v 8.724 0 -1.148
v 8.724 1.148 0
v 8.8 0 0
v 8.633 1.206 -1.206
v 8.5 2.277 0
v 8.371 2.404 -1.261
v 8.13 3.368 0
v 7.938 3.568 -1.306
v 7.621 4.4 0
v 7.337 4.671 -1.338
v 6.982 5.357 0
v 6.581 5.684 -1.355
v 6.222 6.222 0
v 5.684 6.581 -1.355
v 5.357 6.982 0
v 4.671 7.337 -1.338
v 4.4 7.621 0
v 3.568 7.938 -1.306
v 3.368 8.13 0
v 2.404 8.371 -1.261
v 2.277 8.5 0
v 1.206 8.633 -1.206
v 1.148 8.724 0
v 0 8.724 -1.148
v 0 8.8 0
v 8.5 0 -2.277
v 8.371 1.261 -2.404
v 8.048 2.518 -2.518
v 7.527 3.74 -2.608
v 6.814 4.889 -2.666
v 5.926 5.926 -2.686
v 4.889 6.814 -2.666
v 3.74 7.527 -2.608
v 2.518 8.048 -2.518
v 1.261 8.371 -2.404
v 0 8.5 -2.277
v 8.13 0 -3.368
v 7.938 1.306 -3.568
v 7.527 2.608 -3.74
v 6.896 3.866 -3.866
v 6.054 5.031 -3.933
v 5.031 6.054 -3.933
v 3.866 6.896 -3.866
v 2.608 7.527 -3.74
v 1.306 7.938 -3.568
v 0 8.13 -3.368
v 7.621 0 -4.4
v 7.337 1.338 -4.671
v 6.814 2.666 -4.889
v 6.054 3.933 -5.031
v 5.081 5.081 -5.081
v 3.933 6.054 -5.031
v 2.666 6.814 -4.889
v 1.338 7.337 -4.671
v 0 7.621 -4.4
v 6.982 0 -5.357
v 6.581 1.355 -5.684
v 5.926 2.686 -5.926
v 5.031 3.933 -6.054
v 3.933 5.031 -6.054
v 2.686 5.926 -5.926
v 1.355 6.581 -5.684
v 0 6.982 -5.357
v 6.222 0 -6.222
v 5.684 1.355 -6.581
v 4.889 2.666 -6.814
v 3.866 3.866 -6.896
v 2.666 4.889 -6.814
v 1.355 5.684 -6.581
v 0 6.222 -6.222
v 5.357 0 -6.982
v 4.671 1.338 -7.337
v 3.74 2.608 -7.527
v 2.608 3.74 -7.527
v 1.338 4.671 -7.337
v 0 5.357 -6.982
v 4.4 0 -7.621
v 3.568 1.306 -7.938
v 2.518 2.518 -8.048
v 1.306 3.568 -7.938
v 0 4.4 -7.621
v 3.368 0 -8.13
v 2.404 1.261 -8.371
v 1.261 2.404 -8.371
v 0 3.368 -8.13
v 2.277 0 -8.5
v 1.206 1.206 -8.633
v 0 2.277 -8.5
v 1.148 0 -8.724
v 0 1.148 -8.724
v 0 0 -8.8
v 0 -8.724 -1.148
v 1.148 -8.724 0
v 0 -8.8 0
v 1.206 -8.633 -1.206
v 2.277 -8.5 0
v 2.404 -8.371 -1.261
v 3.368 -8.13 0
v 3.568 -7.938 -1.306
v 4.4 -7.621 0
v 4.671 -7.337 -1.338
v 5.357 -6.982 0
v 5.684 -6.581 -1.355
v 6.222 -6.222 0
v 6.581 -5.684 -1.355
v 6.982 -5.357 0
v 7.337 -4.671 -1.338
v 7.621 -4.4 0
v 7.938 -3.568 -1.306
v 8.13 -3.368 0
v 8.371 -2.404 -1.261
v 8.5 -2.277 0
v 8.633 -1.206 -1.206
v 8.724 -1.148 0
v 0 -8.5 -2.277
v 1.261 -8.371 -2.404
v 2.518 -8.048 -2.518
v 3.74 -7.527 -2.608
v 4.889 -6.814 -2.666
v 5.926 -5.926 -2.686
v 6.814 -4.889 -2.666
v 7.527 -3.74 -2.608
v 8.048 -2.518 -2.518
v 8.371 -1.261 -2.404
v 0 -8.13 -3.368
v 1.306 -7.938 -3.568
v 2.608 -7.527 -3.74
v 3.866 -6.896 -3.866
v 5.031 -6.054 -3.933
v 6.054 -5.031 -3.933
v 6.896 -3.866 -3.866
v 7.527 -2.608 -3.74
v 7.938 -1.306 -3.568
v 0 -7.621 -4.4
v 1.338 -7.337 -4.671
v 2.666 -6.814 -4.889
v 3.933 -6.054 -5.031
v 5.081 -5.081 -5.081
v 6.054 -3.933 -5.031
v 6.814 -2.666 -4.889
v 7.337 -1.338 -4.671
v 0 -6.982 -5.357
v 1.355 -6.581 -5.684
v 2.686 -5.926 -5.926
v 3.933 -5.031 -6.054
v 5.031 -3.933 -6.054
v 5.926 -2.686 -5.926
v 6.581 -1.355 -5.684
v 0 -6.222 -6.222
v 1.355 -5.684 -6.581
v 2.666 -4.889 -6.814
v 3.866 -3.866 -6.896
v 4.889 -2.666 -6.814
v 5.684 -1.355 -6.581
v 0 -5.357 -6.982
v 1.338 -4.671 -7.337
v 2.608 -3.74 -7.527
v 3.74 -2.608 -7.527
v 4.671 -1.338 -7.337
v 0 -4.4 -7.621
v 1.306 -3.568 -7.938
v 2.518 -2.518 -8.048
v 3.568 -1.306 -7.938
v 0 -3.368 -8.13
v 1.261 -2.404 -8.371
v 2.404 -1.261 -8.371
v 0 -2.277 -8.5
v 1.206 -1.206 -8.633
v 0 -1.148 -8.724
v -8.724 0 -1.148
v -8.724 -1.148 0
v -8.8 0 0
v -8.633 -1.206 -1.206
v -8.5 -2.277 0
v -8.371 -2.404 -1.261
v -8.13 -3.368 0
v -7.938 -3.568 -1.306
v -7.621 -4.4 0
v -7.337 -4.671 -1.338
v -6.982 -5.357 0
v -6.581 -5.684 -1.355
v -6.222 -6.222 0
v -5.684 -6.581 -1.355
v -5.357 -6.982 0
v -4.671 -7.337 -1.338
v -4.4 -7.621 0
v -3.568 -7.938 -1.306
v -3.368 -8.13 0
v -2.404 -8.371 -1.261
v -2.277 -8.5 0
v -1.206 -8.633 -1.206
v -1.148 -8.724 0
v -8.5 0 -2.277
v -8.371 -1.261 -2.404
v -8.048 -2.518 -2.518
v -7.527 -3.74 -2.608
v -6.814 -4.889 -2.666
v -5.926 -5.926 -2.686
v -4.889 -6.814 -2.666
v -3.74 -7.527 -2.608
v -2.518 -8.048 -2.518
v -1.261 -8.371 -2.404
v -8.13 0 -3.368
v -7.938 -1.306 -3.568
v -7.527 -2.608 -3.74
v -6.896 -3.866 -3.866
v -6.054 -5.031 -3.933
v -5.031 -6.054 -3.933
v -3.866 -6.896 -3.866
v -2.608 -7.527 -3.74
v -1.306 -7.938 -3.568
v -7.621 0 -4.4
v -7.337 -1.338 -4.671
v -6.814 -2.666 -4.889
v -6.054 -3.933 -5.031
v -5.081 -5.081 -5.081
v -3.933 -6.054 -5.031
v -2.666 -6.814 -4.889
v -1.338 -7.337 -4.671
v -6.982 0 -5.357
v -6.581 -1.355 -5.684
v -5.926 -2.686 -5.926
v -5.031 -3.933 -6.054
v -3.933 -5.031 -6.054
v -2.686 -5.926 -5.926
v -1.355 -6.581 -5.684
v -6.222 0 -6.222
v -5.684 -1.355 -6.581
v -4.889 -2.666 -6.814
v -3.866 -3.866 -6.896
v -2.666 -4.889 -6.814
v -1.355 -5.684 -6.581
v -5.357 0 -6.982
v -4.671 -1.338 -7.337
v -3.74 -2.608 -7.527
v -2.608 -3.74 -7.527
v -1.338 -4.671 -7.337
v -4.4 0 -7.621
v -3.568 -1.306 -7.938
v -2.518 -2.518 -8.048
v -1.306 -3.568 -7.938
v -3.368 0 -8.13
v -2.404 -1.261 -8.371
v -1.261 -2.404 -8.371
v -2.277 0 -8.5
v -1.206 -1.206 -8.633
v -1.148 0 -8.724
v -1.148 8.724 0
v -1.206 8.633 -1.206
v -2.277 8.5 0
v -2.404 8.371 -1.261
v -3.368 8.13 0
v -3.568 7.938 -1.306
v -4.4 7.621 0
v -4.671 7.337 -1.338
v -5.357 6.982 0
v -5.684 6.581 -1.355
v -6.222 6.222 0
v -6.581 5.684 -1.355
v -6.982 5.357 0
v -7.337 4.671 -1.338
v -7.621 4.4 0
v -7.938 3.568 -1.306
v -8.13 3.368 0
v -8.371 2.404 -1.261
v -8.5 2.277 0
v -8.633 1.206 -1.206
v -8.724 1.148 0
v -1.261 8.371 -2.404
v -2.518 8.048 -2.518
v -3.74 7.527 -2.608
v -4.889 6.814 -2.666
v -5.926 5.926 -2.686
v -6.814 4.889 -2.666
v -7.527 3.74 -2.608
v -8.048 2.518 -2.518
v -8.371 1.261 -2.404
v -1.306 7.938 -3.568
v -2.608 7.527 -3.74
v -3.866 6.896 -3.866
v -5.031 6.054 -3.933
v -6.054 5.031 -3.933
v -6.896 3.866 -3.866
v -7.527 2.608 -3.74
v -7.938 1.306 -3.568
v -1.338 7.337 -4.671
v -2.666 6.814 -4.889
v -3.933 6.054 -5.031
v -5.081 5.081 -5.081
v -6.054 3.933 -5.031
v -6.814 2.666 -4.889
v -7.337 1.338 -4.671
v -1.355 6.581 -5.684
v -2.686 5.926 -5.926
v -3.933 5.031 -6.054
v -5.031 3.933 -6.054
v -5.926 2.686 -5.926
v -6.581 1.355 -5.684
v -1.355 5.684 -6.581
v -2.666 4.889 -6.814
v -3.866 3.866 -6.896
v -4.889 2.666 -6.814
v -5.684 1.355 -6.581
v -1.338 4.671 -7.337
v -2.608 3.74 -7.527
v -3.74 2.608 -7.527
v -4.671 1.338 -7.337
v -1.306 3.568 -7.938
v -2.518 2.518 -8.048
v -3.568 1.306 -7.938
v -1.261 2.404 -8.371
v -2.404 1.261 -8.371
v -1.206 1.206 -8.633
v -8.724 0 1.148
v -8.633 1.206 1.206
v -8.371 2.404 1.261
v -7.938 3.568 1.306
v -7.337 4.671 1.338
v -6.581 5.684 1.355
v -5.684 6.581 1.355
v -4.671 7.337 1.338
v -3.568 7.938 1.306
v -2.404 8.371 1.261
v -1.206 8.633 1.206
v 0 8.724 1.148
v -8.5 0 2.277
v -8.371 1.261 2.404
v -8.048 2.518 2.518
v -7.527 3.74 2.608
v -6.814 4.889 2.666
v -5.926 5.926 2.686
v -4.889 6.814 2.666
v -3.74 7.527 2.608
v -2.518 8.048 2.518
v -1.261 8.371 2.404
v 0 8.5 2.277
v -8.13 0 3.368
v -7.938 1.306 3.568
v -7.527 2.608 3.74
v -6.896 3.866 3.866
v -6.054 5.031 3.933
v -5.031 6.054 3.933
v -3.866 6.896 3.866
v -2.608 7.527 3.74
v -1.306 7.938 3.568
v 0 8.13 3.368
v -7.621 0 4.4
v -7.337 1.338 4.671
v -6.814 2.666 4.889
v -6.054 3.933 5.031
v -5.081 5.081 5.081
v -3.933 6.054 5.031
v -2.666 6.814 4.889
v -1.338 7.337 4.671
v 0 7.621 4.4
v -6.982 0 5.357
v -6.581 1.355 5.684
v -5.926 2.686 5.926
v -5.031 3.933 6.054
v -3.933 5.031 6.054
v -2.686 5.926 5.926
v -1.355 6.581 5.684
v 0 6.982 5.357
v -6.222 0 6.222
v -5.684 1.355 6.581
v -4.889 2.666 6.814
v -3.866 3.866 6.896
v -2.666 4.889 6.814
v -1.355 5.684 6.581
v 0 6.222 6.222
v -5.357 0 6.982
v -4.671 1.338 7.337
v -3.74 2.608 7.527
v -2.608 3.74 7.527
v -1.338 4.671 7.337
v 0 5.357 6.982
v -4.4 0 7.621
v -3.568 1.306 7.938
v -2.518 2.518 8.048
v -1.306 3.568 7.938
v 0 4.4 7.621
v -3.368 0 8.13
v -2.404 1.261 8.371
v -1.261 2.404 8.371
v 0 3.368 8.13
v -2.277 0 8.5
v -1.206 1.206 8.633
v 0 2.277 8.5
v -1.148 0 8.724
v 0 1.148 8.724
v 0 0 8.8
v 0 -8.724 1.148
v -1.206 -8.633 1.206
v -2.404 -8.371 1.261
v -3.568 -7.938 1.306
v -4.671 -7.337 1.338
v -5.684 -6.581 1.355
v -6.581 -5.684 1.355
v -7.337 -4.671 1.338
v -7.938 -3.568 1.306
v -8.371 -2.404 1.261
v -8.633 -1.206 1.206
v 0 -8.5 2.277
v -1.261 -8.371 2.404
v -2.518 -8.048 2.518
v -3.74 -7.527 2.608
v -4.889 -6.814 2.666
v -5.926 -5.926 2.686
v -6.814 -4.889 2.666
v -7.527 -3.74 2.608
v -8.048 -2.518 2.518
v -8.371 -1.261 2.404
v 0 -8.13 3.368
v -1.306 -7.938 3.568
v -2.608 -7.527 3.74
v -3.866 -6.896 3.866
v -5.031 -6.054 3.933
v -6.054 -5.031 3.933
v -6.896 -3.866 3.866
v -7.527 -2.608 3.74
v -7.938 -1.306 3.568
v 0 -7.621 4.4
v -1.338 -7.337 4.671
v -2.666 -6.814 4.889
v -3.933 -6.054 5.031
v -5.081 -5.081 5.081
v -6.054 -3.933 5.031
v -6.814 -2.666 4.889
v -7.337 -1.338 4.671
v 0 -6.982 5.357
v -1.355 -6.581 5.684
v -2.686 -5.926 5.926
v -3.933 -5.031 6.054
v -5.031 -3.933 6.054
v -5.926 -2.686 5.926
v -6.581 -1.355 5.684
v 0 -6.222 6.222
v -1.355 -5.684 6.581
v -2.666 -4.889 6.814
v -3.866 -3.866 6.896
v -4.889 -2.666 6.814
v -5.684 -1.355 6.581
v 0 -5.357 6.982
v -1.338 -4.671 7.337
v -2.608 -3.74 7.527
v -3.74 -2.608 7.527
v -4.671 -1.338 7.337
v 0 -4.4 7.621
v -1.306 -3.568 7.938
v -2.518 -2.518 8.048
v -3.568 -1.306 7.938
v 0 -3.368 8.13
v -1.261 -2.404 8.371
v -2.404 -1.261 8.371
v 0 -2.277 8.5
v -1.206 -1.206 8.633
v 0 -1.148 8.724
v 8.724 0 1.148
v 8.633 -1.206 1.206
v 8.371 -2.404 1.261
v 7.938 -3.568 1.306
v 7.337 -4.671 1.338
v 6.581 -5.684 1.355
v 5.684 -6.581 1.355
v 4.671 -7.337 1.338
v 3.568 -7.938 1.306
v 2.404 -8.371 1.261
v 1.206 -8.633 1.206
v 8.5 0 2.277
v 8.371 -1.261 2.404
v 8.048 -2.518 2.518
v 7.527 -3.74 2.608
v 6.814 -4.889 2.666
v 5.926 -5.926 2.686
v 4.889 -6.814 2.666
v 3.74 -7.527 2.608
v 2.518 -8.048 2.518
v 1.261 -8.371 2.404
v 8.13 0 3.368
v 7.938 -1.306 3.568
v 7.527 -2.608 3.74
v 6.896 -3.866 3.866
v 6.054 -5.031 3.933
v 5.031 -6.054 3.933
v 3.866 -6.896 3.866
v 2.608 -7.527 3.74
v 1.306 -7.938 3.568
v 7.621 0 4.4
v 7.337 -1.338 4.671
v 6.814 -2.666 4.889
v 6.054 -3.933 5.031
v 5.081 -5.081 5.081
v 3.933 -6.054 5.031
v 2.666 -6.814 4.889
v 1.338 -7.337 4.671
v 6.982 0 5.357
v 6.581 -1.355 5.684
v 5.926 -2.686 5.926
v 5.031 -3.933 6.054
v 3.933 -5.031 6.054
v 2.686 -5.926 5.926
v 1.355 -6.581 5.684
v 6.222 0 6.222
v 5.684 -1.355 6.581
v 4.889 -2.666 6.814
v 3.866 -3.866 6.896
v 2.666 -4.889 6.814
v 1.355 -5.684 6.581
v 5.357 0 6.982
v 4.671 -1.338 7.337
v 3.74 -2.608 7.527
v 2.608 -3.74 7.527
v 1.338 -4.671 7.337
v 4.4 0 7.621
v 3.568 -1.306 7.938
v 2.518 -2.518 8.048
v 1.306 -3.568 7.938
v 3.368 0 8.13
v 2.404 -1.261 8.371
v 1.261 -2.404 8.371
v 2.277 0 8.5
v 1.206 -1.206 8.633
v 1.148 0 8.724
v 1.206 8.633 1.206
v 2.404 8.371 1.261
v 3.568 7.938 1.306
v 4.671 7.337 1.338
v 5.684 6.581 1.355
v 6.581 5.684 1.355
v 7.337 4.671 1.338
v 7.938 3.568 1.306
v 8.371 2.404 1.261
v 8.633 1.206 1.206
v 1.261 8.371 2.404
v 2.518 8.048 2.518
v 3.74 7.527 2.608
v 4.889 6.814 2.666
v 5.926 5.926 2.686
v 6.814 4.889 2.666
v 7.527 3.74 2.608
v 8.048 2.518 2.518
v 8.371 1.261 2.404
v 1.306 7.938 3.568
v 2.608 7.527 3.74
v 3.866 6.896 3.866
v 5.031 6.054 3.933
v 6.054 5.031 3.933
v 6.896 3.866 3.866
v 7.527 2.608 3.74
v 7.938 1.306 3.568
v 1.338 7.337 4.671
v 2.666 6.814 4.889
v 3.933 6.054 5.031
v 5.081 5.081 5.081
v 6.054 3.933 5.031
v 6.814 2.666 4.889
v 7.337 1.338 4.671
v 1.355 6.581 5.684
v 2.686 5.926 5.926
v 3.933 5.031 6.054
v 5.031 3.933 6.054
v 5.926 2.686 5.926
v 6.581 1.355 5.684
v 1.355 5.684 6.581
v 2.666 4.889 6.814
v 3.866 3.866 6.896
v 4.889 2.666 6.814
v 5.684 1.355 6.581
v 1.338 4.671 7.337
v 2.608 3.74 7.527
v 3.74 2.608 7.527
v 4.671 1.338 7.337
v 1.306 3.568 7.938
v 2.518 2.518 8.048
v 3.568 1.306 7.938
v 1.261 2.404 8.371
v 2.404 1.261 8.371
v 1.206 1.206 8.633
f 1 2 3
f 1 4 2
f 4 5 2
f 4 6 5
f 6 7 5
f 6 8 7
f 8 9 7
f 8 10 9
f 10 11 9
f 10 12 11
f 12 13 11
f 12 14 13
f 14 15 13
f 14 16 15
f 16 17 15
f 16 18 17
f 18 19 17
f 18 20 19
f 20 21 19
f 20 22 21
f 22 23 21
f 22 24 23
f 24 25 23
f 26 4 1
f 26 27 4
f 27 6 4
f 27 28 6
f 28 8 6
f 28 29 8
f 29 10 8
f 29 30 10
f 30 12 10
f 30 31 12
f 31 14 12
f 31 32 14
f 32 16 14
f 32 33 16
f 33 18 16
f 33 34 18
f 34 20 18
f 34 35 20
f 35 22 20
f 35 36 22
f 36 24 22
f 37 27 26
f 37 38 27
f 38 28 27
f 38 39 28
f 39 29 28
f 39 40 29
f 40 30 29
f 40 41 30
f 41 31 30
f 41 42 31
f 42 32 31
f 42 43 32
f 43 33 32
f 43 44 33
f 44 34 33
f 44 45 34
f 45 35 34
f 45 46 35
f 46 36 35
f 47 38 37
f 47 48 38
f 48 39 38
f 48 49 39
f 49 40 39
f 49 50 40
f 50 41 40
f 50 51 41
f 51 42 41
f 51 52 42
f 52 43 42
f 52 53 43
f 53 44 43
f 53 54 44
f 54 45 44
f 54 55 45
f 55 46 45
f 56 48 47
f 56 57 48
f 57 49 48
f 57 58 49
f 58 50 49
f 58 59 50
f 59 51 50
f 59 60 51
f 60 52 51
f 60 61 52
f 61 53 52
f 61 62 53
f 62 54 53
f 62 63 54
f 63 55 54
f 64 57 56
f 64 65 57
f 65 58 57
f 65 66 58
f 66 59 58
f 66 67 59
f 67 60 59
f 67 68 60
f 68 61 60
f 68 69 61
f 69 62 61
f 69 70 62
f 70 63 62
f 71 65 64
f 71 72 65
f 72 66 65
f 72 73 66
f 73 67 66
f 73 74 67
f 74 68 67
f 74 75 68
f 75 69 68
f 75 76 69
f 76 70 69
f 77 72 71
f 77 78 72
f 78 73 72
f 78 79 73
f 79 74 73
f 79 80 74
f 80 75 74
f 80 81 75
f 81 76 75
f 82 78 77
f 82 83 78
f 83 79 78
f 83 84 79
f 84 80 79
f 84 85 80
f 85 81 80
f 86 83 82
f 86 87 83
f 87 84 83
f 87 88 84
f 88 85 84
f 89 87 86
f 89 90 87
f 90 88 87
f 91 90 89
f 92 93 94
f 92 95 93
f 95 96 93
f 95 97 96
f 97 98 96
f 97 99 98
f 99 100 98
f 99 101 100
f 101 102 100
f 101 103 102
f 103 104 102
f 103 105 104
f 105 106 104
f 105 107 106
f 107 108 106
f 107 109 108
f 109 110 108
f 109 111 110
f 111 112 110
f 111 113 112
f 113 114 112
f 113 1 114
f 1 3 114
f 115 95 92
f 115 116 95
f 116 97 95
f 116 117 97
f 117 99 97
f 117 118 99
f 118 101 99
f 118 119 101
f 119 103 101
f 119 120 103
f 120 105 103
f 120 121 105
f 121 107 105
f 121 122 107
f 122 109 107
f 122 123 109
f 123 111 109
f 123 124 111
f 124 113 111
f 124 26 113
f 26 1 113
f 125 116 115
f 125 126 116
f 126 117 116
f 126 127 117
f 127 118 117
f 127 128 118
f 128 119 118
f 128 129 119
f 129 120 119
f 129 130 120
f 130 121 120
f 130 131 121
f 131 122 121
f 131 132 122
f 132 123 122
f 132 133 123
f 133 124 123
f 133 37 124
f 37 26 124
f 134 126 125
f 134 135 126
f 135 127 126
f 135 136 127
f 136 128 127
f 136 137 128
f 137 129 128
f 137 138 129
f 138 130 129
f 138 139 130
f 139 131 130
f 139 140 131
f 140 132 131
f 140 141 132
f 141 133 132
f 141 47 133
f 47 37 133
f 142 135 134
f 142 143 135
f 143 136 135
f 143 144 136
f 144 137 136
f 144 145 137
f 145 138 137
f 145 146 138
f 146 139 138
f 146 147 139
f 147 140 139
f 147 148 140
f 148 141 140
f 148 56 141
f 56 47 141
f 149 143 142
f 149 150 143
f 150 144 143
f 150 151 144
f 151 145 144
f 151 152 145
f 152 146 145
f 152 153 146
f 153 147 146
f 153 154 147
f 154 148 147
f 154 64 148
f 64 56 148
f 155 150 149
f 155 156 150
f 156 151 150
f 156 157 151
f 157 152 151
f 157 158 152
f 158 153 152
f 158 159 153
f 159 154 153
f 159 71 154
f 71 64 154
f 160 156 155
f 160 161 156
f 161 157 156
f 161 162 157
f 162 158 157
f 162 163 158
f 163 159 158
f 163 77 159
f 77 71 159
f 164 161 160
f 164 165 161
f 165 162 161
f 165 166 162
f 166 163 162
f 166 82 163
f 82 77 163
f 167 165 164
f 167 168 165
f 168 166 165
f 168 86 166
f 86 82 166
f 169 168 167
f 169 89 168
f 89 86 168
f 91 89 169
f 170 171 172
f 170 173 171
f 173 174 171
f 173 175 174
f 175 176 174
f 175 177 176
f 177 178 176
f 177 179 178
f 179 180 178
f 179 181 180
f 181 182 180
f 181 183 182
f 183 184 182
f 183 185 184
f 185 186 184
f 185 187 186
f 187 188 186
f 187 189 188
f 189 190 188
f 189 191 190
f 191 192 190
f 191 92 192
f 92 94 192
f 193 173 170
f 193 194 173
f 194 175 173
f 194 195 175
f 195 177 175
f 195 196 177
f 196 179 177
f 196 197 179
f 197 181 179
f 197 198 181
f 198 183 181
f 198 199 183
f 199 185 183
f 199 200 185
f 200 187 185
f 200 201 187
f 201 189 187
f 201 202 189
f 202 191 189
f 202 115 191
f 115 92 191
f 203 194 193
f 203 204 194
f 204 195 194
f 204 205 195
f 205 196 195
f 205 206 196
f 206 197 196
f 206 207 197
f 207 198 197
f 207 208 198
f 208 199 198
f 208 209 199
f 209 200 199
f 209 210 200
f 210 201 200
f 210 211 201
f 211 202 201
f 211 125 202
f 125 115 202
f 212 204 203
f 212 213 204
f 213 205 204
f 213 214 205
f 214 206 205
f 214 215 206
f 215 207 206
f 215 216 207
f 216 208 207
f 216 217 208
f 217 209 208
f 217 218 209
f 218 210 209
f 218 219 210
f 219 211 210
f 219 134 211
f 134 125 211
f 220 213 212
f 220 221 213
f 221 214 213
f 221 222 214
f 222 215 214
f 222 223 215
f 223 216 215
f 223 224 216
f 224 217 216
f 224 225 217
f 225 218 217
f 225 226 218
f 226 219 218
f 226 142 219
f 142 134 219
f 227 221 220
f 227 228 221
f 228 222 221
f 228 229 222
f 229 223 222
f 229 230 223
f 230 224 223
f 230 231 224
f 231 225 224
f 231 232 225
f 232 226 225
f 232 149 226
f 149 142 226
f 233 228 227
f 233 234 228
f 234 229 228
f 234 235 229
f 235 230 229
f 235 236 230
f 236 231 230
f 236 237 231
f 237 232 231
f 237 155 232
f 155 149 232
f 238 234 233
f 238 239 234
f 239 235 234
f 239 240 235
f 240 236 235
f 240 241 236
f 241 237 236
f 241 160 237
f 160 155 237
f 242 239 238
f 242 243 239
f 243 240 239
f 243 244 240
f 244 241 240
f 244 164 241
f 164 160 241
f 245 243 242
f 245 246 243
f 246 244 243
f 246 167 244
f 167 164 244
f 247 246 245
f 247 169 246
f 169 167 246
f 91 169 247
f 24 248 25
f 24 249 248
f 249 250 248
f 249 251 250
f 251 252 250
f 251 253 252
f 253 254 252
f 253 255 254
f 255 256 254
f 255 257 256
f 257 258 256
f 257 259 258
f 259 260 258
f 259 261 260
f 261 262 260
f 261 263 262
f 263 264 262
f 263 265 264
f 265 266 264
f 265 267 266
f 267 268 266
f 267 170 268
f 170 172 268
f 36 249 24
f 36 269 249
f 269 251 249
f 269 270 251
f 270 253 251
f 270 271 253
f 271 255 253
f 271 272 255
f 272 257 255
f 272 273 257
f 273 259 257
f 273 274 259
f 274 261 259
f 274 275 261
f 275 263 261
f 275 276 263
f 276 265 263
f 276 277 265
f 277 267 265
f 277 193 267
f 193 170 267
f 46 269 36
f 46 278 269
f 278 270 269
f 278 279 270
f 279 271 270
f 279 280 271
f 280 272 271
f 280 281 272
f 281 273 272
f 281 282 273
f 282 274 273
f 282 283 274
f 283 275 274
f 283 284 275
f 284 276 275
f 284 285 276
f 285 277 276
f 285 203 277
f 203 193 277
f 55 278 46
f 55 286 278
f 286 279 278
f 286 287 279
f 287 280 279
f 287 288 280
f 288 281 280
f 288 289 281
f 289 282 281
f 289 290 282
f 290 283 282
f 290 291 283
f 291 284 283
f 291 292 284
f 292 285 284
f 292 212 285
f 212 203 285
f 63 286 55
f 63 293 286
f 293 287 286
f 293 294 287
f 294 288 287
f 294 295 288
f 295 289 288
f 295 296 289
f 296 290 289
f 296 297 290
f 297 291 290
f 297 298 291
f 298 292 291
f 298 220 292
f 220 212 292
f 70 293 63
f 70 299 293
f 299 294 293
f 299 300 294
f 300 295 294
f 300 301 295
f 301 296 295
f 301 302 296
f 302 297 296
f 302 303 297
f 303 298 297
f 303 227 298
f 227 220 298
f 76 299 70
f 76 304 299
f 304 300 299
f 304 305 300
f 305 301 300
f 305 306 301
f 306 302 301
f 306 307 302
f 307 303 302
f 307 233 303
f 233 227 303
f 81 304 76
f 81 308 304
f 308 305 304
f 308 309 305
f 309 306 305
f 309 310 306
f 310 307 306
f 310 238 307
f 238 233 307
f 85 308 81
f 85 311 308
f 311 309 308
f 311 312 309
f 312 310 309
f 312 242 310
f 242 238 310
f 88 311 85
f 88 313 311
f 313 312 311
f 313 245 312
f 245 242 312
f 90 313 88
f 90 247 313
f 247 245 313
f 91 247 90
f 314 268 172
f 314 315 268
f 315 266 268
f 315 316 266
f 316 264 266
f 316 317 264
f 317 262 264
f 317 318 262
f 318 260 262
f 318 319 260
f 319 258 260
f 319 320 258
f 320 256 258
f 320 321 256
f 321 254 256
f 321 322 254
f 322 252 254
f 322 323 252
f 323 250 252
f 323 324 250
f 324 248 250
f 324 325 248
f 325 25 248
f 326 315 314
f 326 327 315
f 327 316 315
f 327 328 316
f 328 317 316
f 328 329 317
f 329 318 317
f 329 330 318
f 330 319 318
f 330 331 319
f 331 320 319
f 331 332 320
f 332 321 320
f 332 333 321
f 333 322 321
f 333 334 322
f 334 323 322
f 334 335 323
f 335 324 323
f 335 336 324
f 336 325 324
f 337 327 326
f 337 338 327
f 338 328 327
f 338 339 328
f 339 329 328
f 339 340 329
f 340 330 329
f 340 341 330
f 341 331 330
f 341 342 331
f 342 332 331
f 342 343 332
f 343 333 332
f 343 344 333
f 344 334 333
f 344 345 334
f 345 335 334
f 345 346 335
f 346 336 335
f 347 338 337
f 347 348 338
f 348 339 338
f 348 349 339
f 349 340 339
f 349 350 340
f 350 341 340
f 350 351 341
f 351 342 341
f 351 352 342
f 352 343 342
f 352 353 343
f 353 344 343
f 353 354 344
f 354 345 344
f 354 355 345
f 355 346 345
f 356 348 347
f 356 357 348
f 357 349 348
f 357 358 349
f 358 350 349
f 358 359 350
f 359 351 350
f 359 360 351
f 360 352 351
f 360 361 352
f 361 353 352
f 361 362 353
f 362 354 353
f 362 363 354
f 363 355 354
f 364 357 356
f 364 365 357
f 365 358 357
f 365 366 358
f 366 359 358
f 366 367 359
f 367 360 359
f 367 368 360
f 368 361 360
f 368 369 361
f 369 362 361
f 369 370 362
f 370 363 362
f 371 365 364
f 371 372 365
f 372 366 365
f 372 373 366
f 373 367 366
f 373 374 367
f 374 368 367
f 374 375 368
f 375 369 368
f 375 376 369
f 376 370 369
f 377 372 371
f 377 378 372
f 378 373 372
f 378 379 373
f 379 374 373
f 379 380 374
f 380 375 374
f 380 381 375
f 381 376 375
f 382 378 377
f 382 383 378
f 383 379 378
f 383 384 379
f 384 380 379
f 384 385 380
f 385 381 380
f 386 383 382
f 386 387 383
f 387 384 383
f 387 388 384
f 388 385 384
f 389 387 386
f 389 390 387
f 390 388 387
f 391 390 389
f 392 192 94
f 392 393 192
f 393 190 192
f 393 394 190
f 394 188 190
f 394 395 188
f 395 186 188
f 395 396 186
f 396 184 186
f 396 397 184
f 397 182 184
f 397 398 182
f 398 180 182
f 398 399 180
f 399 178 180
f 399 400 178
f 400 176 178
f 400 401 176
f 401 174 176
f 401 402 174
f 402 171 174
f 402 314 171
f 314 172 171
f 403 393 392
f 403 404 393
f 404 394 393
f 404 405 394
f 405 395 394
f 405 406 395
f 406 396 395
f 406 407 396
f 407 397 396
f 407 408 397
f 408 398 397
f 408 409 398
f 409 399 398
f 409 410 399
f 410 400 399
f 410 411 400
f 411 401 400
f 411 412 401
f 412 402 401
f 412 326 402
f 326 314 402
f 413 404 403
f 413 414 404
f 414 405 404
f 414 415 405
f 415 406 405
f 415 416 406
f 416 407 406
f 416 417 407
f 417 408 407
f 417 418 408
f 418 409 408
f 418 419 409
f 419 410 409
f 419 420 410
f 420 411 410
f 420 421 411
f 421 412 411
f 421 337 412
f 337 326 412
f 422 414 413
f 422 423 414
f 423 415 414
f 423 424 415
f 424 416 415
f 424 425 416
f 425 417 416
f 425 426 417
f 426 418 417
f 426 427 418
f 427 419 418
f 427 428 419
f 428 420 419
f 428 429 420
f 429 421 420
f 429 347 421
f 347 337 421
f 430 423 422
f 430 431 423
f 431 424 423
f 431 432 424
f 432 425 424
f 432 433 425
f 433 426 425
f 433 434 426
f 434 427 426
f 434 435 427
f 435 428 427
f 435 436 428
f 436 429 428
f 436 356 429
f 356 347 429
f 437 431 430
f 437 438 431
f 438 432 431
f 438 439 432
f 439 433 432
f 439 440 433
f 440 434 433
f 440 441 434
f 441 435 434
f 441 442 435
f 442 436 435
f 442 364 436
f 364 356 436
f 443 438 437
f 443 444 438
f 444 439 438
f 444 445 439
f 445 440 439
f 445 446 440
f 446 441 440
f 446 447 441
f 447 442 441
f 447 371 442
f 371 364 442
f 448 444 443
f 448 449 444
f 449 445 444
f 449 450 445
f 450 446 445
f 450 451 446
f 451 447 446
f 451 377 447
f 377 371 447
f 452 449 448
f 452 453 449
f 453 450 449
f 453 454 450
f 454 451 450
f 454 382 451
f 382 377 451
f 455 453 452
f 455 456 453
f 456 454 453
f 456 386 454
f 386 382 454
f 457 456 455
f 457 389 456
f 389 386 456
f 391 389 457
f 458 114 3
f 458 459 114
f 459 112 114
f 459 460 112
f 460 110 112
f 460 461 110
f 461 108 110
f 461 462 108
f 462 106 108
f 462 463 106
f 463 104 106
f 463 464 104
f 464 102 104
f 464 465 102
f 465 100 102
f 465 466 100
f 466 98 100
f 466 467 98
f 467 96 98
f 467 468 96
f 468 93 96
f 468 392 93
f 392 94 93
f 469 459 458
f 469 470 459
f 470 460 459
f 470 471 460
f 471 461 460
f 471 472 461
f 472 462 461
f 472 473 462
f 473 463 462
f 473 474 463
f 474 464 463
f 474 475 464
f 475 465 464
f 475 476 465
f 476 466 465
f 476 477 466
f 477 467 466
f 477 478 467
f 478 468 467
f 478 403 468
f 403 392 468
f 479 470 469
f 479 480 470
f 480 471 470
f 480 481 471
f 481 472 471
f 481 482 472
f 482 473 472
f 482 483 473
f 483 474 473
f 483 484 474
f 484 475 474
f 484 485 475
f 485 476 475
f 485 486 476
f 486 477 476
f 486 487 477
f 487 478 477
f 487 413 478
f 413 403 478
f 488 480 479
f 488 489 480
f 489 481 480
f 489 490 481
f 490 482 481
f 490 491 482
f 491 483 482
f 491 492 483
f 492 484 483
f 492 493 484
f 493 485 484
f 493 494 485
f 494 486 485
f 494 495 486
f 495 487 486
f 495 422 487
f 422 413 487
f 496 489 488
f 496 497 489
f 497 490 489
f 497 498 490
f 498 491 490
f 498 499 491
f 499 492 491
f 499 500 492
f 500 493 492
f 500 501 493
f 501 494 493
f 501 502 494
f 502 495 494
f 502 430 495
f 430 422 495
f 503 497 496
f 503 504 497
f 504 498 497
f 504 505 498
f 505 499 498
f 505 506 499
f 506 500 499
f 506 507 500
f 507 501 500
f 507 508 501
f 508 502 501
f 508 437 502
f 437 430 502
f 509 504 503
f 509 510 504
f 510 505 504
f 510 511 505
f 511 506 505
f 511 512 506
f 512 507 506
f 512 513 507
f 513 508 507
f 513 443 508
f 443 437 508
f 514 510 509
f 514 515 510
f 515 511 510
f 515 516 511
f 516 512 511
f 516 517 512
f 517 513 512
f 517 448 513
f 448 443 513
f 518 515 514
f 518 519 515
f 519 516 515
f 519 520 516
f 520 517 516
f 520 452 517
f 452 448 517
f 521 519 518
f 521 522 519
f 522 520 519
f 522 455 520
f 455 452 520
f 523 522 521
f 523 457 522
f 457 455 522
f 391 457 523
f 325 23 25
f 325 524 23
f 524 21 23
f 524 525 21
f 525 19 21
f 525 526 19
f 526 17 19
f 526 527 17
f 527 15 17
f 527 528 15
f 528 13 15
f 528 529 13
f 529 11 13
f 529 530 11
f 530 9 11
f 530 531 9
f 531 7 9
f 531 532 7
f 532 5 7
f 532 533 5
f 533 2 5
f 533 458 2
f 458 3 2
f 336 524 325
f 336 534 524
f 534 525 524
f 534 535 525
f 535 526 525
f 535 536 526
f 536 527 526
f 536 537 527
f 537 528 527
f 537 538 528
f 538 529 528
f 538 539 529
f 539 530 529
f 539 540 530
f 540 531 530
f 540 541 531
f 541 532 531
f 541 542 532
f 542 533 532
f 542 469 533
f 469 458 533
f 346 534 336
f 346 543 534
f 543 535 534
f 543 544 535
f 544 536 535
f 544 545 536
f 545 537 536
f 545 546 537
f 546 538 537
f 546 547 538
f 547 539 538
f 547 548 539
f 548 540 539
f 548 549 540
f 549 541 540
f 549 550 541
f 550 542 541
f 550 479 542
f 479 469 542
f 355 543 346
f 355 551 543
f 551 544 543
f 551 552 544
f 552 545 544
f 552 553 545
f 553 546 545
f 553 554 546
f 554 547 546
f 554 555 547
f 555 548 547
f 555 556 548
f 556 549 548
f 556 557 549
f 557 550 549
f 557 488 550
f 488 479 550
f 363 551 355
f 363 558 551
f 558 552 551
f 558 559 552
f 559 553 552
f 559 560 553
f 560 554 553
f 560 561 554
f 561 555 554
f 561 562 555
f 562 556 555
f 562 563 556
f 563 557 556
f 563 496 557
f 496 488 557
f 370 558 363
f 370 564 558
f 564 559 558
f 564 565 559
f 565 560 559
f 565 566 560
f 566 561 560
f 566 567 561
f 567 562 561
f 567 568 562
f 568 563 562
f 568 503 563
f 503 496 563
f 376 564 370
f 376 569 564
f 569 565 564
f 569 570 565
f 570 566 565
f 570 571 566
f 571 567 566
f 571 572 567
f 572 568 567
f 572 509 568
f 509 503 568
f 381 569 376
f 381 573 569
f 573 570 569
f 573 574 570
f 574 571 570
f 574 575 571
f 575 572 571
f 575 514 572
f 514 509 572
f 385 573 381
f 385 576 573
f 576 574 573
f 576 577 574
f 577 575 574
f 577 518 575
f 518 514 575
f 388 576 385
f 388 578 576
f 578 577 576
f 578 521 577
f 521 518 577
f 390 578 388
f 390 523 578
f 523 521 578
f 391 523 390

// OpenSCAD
// file: ../p/48/8-8sphe.scad
use <../../lib.scad>
use <1-8sphe.scad>
function ldraw_lib__48__8_8sphe() = [
// 0 Hi-Res Sphere 1.0
// 0 Name: 48\8-8sphe.dat
// 0 Author: Steve Bliss [sbliss]
// 0 !LDRAW_ORG 48_Primitive UPDATE 2012-01
// 0 !LICENSE Licensed under CC BY 2.0 and CC BY 4.0 : see CAreadme.txt
// 
// 0 BFC CERTIFY CCW
  [0,"BFC","CERTIFY"],
  [0,"BFC","CCW"],
// 
// 0 !HISTORY 2012-03-30 [PTadmin] Official Update 2012-01
// 
// 
// 1 16 0 0 0 1 0 0 0 1 0 0 0 1 48\1-8sphe.dat
  [1,16,0,0,0,1,0,0,0,1,0,0,0,1, ldraw_lib__48__1_8sphe()],
// 1 16 0 0 0 0 0 1 0 1 0 -1 0 0 48\1-8sphe.dat
  [1,16,0,0,0,0,0,1,0,1,0,-1,0,0, ldraw_lib__48__1_8sphe()],
// 1 16 0 0 0 -1 0 0 0 1 0 0 0 -1 48\1-8sphe.dat
  [1,16,0,0,0,-1,0,0,0,1,0,0,0,-1, ldraw_lib__48__1_8sphe()],
// 1 16 0 0 0 0 0 -1 0 1 0 1 0 0 48\1-8sphe.dat
  [1,16,0,0,0,0,0,-1,0,1,0,1,0,0, ldraw_lib__48__1_8sphe()],
// 1 16 0 0 0 -1 0 0 0 -1 0 0 0 1 48\1-8sphe.dat
  [1,16,0,0,0,-1,0,0,0,-1,0,0,0,1, ldraw_lib__48__1_8sphe()],
// 1 16 0 0 0 0 0 -1 0 -1 0 -1 0 0 48\1-8sphe.dat
  [1,16,0,0,0,0,0,-1,0,-1,0,-1,0,0, ldraw_lib__48__1_8sphe()],
// 1 16 0 0 0 1 0 0 0 -1 0 0 0 -1 48\1-8sphe.dat
  [1,16,0,0,0,1,0,0,0,-1,0,0,0,-1, ldraw_lib__48__1_8sphe()],
// 1 16 0 0 0 0 0 1 0 -1 0 1 0 0 48\1-8sphe.dat
  [1,16,0,0,0,0,0,1,0,-1,0,1,0,0, ldraw_lib__48__1_8sphe()],
// 0
];
makepoly(ldraw_lib__48__8_8sphe(), line=0.2);
// main file
use <../lib.scad>
use <../p/48/8-8sphe.scad>
function ldraw_lib__light() = [
// 0 ~Light Source
// 0 Name: light.dat
// 0 Author: James Jessiman
// 0 !LDRAW_ORG Part UPDATE 2022-06
// 0 !LICENSE Licensed under CC BY 2.0 and CC BY 4.0 : see CAreadme.txt
// 
// 0 !HELP You can use this file to place light sources into your LDRAW scene.
// 0 !HELP When you then later use this scene with a renderer,
// 0 !HELP you can replace this "part" by a real light source.
// 0 !HELP Having this file allows to do light placement using the usual scene editing CAD programs.
// 0 !HELP LDView for example has a dedicated user option for configuring how to treat this file.
// 0 !HELP Example Usage:
// 0 !HELP 1 4 0 0 0 1 0 0 0 1 0 0 0 1 4070.dat
// 0 !HELP 1 46 0 10 -14 0 0 1 1 0 0 0 1 0 6141.dat
// 0 !HELP 1 47 0 10 -11 0 0 1 1 0 0 0 1 0 light.dat
// 
// 0 BFC CERTIFY CCW
  [0,"BFC","CERTIFY"],
  [0,"BFC","CCW"],
// 
// 0 !CATEGORY Helper
// 
// 0 !HISTORY 2007-07-29 [PTadmin] Header formatted for Contributor Agreement
// 0 !HISTORY 2008-07-01 [PTadmin] Official Update 2008-01
// 0 !HISTORY 2017-03-03 [Steffen] retitled to be no longer POV-Ray specific, added !HELP text, replaced former implementation (6 edges) by 1 sphere
// 0 !HISTORY 2022-12-20 [PTadmin] Official Update 2022-06
// 
// 
// 0 BFC NOCLIP
  [0,"BFC","NOCLIP"],
// 
// 1 16 0 0 0 22 0 0 0 22 0 0 0 22 48\8-8sphe.dat
  [1,16,0,0,0,22,0,0,0,22,0,0,0,22, ldraw_lib__48__8_8sphe()],
];
makepoly(ldraw_lib__light(), line=0.2);
